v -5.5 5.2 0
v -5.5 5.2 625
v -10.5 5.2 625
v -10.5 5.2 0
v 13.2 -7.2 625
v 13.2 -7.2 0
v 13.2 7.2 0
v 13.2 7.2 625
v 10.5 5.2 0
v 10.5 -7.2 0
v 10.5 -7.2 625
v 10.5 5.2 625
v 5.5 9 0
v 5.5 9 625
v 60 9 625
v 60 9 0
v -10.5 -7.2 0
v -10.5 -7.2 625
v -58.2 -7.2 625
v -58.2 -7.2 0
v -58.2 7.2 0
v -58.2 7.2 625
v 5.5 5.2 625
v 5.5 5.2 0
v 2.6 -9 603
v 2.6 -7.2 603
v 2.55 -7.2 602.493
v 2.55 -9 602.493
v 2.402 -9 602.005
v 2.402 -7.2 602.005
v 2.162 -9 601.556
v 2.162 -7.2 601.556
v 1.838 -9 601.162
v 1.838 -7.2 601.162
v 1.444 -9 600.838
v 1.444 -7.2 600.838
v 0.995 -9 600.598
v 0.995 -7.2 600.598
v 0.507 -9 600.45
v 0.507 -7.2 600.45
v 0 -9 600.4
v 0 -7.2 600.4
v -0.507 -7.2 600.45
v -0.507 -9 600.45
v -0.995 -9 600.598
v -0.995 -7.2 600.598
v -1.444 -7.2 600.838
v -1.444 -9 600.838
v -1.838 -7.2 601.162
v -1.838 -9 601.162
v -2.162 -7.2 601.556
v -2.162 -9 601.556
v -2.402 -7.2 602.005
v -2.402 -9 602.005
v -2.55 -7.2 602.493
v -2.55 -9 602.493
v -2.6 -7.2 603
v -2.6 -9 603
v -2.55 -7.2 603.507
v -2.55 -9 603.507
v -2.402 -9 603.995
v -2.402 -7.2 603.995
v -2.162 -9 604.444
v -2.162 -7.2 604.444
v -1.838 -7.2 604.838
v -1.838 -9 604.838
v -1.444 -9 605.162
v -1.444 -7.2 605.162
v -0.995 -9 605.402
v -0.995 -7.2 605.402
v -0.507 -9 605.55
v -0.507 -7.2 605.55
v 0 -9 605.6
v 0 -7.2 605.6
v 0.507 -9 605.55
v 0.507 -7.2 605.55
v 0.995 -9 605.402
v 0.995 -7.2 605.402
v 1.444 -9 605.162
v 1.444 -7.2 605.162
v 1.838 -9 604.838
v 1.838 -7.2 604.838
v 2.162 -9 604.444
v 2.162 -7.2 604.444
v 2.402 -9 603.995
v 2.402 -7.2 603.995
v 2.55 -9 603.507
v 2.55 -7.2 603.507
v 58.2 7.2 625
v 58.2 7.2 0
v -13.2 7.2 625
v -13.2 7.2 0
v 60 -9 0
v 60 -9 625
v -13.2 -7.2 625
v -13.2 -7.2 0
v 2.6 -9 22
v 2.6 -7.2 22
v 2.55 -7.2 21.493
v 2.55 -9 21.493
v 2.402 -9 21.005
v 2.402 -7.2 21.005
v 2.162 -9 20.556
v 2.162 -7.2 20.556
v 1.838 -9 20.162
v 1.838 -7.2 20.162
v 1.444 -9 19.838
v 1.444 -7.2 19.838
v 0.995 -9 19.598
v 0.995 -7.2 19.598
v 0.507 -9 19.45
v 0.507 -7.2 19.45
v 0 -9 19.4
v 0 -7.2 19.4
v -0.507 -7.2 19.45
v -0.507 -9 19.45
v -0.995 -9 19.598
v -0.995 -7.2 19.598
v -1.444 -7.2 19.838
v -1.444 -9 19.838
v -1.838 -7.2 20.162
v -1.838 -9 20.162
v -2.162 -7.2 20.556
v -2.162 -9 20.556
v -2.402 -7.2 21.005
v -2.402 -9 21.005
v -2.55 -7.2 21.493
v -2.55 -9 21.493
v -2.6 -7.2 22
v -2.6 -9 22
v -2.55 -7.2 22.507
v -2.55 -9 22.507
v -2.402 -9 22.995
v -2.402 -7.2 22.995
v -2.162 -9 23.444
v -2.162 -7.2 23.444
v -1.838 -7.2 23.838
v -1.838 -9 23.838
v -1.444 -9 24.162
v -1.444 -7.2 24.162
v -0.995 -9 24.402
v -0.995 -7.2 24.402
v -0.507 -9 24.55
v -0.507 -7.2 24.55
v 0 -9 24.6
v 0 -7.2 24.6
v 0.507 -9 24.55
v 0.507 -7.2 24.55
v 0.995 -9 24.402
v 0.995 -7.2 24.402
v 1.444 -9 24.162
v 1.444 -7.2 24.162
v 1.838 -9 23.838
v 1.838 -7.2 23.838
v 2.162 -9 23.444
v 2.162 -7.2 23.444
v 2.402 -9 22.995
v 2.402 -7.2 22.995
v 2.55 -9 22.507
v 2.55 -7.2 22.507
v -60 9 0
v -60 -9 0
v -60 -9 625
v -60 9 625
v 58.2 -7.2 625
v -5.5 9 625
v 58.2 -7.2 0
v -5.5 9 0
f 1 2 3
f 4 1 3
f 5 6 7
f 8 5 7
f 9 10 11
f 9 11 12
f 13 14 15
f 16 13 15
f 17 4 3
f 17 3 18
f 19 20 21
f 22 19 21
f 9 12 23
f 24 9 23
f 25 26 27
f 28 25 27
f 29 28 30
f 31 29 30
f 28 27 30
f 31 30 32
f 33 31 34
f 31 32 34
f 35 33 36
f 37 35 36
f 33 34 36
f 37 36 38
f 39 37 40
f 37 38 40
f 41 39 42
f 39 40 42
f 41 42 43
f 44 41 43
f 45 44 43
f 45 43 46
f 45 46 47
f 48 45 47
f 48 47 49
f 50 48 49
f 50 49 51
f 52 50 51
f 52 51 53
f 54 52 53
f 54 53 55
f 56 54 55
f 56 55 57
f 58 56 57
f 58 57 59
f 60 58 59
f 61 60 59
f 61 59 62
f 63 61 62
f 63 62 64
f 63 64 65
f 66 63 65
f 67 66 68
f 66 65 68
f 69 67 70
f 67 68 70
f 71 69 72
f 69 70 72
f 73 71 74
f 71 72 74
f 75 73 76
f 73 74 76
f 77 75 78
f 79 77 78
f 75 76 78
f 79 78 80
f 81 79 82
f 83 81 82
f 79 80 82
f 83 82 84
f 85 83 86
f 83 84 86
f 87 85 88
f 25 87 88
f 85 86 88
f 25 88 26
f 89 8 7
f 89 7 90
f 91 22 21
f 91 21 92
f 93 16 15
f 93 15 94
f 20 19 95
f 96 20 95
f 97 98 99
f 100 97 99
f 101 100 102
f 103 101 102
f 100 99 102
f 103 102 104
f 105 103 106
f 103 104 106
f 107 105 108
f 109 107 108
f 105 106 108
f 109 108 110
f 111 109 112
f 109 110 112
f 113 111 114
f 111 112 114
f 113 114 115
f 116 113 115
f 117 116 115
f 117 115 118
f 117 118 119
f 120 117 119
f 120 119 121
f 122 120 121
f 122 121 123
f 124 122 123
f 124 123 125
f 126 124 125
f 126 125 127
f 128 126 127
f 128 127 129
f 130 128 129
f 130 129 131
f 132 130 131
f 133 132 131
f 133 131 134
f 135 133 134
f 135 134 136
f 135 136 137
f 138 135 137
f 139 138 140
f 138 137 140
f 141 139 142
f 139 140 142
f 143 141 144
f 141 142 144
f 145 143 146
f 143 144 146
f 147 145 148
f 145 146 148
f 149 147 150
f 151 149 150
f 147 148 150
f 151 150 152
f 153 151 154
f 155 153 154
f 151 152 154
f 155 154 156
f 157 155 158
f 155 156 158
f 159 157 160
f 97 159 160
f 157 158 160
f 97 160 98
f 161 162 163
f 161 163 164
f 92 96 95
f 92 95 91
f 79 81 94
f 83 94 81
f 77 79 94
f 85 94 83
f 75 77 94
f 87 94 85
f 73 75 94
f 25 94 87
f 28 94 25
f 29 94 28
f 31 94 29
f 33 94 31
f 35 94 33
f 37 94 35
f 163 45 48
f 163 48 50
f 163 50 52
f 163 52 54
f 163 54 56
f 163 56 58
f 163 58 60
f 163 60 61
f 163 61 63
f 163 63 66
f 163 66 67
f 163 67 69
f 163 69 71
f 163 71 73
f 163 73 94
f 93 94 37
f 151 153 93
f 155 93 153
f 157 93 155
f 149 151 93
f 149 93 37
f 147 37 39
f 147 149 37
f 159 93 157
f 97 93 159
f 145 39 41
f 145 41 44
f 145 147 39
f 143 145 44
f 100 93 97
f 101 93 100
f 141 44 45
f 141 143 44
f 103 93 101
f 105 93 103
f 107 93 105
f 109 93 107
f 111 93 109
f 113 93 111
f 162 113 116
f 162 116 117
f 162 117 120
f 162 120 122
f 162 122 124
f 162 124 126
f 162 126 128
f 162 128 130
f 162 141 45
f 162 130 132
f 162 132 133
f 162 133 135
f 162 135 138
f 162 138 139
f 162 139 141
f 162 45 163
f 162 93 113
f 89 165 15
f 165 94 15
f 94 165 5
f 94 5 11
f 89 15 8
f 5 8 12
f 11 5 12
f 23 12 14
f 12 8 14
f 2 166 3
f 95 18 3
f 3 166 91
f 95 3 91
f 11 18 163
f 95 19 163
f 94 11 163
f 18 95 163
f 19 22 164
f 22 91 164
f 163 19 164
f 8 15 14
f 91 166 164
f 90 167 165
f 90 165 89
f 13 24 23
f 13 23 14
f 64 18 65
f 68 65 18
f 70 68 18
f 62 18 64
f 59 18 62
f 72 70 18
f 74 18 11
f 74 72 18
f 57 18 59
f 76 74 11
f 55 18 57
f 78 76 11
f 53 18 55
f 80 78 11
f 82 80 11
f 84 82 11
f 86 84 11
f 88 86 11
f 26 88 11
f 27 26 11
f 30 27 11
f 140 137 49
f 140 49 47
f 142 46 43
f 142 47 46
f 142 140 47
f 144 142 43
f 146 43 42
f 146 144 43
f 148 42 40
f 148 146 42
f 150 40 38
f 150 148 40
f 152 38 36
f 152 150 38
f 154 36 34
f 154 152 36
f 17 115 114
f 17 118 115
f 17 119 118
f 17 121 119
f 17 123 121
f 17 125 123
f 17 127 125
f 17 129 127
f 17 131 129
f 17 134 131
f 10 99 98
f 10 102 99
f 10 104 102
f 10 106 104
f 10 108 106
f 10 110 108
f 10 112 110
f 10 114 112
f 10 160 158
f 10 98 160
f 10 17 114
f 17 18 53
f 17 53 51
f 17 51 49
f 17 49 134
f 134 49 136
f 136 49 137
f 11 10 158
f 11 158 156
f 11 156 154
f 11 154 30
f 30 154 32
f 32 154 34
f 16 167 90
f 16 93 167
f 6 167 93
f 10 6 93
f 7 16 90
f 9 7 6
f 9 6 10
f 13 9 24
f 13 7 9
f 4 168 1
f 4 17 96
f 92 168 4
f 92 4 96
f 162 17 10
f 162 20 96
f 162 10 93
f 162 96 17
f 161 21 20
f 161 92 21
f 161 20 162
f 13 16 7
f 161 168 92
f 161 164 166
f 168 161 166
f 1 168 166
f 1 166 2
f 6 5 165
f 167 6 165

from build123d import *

# Parameters (mm, degrees)
SKETCH1_W                  = 45
SKETCH1_H                  = 14.4
BOSS_EXTRUDE1_DEPTH        = 625
F_5_2_5_2_DIAMETER_HOLE1_D = 5.2


with BuildPart() as part:
    # Sketch1 → Boss-Extrude1 (new body)
    with BuildSketch(Plane.XY):
        Polygon((-10.5, 5.2), (-10.5, -7.2), (10.5, -7.2), (10.5, 5.2), (5.5, 5.2), (5.5, 9), (60, 9), (60, -9), (-60, -9), (-60, 9), (-5.5, 9), (-5.5, 5.2), align=None)
        with Locations((-35.7, 0)):
            Rectangle(SKETCH1_W, SKETCH1_H, mode=Mode.SUBTRACT)
        with Locations((35.7, 0)):
            Rectangle(SKETCH1_W, SKETCH1_H, mode=Mode.SUBTRACT)
    extrude(amount=BOSS_EXTRUDE1_DEPTH)

    # Ø5.2 (5.2) Diameter Hole1 (through all)
    with Locations(Plane(origin=(0, -9, 0), x_dir=(-1, 0, 0), z_dir=(0, -1, 0))):
        with Locations((0, -22), (0, -603)):
            Hole(F_5_2_5_2_DIAMETER_HOLE1_D / 2)


solid = part.part
